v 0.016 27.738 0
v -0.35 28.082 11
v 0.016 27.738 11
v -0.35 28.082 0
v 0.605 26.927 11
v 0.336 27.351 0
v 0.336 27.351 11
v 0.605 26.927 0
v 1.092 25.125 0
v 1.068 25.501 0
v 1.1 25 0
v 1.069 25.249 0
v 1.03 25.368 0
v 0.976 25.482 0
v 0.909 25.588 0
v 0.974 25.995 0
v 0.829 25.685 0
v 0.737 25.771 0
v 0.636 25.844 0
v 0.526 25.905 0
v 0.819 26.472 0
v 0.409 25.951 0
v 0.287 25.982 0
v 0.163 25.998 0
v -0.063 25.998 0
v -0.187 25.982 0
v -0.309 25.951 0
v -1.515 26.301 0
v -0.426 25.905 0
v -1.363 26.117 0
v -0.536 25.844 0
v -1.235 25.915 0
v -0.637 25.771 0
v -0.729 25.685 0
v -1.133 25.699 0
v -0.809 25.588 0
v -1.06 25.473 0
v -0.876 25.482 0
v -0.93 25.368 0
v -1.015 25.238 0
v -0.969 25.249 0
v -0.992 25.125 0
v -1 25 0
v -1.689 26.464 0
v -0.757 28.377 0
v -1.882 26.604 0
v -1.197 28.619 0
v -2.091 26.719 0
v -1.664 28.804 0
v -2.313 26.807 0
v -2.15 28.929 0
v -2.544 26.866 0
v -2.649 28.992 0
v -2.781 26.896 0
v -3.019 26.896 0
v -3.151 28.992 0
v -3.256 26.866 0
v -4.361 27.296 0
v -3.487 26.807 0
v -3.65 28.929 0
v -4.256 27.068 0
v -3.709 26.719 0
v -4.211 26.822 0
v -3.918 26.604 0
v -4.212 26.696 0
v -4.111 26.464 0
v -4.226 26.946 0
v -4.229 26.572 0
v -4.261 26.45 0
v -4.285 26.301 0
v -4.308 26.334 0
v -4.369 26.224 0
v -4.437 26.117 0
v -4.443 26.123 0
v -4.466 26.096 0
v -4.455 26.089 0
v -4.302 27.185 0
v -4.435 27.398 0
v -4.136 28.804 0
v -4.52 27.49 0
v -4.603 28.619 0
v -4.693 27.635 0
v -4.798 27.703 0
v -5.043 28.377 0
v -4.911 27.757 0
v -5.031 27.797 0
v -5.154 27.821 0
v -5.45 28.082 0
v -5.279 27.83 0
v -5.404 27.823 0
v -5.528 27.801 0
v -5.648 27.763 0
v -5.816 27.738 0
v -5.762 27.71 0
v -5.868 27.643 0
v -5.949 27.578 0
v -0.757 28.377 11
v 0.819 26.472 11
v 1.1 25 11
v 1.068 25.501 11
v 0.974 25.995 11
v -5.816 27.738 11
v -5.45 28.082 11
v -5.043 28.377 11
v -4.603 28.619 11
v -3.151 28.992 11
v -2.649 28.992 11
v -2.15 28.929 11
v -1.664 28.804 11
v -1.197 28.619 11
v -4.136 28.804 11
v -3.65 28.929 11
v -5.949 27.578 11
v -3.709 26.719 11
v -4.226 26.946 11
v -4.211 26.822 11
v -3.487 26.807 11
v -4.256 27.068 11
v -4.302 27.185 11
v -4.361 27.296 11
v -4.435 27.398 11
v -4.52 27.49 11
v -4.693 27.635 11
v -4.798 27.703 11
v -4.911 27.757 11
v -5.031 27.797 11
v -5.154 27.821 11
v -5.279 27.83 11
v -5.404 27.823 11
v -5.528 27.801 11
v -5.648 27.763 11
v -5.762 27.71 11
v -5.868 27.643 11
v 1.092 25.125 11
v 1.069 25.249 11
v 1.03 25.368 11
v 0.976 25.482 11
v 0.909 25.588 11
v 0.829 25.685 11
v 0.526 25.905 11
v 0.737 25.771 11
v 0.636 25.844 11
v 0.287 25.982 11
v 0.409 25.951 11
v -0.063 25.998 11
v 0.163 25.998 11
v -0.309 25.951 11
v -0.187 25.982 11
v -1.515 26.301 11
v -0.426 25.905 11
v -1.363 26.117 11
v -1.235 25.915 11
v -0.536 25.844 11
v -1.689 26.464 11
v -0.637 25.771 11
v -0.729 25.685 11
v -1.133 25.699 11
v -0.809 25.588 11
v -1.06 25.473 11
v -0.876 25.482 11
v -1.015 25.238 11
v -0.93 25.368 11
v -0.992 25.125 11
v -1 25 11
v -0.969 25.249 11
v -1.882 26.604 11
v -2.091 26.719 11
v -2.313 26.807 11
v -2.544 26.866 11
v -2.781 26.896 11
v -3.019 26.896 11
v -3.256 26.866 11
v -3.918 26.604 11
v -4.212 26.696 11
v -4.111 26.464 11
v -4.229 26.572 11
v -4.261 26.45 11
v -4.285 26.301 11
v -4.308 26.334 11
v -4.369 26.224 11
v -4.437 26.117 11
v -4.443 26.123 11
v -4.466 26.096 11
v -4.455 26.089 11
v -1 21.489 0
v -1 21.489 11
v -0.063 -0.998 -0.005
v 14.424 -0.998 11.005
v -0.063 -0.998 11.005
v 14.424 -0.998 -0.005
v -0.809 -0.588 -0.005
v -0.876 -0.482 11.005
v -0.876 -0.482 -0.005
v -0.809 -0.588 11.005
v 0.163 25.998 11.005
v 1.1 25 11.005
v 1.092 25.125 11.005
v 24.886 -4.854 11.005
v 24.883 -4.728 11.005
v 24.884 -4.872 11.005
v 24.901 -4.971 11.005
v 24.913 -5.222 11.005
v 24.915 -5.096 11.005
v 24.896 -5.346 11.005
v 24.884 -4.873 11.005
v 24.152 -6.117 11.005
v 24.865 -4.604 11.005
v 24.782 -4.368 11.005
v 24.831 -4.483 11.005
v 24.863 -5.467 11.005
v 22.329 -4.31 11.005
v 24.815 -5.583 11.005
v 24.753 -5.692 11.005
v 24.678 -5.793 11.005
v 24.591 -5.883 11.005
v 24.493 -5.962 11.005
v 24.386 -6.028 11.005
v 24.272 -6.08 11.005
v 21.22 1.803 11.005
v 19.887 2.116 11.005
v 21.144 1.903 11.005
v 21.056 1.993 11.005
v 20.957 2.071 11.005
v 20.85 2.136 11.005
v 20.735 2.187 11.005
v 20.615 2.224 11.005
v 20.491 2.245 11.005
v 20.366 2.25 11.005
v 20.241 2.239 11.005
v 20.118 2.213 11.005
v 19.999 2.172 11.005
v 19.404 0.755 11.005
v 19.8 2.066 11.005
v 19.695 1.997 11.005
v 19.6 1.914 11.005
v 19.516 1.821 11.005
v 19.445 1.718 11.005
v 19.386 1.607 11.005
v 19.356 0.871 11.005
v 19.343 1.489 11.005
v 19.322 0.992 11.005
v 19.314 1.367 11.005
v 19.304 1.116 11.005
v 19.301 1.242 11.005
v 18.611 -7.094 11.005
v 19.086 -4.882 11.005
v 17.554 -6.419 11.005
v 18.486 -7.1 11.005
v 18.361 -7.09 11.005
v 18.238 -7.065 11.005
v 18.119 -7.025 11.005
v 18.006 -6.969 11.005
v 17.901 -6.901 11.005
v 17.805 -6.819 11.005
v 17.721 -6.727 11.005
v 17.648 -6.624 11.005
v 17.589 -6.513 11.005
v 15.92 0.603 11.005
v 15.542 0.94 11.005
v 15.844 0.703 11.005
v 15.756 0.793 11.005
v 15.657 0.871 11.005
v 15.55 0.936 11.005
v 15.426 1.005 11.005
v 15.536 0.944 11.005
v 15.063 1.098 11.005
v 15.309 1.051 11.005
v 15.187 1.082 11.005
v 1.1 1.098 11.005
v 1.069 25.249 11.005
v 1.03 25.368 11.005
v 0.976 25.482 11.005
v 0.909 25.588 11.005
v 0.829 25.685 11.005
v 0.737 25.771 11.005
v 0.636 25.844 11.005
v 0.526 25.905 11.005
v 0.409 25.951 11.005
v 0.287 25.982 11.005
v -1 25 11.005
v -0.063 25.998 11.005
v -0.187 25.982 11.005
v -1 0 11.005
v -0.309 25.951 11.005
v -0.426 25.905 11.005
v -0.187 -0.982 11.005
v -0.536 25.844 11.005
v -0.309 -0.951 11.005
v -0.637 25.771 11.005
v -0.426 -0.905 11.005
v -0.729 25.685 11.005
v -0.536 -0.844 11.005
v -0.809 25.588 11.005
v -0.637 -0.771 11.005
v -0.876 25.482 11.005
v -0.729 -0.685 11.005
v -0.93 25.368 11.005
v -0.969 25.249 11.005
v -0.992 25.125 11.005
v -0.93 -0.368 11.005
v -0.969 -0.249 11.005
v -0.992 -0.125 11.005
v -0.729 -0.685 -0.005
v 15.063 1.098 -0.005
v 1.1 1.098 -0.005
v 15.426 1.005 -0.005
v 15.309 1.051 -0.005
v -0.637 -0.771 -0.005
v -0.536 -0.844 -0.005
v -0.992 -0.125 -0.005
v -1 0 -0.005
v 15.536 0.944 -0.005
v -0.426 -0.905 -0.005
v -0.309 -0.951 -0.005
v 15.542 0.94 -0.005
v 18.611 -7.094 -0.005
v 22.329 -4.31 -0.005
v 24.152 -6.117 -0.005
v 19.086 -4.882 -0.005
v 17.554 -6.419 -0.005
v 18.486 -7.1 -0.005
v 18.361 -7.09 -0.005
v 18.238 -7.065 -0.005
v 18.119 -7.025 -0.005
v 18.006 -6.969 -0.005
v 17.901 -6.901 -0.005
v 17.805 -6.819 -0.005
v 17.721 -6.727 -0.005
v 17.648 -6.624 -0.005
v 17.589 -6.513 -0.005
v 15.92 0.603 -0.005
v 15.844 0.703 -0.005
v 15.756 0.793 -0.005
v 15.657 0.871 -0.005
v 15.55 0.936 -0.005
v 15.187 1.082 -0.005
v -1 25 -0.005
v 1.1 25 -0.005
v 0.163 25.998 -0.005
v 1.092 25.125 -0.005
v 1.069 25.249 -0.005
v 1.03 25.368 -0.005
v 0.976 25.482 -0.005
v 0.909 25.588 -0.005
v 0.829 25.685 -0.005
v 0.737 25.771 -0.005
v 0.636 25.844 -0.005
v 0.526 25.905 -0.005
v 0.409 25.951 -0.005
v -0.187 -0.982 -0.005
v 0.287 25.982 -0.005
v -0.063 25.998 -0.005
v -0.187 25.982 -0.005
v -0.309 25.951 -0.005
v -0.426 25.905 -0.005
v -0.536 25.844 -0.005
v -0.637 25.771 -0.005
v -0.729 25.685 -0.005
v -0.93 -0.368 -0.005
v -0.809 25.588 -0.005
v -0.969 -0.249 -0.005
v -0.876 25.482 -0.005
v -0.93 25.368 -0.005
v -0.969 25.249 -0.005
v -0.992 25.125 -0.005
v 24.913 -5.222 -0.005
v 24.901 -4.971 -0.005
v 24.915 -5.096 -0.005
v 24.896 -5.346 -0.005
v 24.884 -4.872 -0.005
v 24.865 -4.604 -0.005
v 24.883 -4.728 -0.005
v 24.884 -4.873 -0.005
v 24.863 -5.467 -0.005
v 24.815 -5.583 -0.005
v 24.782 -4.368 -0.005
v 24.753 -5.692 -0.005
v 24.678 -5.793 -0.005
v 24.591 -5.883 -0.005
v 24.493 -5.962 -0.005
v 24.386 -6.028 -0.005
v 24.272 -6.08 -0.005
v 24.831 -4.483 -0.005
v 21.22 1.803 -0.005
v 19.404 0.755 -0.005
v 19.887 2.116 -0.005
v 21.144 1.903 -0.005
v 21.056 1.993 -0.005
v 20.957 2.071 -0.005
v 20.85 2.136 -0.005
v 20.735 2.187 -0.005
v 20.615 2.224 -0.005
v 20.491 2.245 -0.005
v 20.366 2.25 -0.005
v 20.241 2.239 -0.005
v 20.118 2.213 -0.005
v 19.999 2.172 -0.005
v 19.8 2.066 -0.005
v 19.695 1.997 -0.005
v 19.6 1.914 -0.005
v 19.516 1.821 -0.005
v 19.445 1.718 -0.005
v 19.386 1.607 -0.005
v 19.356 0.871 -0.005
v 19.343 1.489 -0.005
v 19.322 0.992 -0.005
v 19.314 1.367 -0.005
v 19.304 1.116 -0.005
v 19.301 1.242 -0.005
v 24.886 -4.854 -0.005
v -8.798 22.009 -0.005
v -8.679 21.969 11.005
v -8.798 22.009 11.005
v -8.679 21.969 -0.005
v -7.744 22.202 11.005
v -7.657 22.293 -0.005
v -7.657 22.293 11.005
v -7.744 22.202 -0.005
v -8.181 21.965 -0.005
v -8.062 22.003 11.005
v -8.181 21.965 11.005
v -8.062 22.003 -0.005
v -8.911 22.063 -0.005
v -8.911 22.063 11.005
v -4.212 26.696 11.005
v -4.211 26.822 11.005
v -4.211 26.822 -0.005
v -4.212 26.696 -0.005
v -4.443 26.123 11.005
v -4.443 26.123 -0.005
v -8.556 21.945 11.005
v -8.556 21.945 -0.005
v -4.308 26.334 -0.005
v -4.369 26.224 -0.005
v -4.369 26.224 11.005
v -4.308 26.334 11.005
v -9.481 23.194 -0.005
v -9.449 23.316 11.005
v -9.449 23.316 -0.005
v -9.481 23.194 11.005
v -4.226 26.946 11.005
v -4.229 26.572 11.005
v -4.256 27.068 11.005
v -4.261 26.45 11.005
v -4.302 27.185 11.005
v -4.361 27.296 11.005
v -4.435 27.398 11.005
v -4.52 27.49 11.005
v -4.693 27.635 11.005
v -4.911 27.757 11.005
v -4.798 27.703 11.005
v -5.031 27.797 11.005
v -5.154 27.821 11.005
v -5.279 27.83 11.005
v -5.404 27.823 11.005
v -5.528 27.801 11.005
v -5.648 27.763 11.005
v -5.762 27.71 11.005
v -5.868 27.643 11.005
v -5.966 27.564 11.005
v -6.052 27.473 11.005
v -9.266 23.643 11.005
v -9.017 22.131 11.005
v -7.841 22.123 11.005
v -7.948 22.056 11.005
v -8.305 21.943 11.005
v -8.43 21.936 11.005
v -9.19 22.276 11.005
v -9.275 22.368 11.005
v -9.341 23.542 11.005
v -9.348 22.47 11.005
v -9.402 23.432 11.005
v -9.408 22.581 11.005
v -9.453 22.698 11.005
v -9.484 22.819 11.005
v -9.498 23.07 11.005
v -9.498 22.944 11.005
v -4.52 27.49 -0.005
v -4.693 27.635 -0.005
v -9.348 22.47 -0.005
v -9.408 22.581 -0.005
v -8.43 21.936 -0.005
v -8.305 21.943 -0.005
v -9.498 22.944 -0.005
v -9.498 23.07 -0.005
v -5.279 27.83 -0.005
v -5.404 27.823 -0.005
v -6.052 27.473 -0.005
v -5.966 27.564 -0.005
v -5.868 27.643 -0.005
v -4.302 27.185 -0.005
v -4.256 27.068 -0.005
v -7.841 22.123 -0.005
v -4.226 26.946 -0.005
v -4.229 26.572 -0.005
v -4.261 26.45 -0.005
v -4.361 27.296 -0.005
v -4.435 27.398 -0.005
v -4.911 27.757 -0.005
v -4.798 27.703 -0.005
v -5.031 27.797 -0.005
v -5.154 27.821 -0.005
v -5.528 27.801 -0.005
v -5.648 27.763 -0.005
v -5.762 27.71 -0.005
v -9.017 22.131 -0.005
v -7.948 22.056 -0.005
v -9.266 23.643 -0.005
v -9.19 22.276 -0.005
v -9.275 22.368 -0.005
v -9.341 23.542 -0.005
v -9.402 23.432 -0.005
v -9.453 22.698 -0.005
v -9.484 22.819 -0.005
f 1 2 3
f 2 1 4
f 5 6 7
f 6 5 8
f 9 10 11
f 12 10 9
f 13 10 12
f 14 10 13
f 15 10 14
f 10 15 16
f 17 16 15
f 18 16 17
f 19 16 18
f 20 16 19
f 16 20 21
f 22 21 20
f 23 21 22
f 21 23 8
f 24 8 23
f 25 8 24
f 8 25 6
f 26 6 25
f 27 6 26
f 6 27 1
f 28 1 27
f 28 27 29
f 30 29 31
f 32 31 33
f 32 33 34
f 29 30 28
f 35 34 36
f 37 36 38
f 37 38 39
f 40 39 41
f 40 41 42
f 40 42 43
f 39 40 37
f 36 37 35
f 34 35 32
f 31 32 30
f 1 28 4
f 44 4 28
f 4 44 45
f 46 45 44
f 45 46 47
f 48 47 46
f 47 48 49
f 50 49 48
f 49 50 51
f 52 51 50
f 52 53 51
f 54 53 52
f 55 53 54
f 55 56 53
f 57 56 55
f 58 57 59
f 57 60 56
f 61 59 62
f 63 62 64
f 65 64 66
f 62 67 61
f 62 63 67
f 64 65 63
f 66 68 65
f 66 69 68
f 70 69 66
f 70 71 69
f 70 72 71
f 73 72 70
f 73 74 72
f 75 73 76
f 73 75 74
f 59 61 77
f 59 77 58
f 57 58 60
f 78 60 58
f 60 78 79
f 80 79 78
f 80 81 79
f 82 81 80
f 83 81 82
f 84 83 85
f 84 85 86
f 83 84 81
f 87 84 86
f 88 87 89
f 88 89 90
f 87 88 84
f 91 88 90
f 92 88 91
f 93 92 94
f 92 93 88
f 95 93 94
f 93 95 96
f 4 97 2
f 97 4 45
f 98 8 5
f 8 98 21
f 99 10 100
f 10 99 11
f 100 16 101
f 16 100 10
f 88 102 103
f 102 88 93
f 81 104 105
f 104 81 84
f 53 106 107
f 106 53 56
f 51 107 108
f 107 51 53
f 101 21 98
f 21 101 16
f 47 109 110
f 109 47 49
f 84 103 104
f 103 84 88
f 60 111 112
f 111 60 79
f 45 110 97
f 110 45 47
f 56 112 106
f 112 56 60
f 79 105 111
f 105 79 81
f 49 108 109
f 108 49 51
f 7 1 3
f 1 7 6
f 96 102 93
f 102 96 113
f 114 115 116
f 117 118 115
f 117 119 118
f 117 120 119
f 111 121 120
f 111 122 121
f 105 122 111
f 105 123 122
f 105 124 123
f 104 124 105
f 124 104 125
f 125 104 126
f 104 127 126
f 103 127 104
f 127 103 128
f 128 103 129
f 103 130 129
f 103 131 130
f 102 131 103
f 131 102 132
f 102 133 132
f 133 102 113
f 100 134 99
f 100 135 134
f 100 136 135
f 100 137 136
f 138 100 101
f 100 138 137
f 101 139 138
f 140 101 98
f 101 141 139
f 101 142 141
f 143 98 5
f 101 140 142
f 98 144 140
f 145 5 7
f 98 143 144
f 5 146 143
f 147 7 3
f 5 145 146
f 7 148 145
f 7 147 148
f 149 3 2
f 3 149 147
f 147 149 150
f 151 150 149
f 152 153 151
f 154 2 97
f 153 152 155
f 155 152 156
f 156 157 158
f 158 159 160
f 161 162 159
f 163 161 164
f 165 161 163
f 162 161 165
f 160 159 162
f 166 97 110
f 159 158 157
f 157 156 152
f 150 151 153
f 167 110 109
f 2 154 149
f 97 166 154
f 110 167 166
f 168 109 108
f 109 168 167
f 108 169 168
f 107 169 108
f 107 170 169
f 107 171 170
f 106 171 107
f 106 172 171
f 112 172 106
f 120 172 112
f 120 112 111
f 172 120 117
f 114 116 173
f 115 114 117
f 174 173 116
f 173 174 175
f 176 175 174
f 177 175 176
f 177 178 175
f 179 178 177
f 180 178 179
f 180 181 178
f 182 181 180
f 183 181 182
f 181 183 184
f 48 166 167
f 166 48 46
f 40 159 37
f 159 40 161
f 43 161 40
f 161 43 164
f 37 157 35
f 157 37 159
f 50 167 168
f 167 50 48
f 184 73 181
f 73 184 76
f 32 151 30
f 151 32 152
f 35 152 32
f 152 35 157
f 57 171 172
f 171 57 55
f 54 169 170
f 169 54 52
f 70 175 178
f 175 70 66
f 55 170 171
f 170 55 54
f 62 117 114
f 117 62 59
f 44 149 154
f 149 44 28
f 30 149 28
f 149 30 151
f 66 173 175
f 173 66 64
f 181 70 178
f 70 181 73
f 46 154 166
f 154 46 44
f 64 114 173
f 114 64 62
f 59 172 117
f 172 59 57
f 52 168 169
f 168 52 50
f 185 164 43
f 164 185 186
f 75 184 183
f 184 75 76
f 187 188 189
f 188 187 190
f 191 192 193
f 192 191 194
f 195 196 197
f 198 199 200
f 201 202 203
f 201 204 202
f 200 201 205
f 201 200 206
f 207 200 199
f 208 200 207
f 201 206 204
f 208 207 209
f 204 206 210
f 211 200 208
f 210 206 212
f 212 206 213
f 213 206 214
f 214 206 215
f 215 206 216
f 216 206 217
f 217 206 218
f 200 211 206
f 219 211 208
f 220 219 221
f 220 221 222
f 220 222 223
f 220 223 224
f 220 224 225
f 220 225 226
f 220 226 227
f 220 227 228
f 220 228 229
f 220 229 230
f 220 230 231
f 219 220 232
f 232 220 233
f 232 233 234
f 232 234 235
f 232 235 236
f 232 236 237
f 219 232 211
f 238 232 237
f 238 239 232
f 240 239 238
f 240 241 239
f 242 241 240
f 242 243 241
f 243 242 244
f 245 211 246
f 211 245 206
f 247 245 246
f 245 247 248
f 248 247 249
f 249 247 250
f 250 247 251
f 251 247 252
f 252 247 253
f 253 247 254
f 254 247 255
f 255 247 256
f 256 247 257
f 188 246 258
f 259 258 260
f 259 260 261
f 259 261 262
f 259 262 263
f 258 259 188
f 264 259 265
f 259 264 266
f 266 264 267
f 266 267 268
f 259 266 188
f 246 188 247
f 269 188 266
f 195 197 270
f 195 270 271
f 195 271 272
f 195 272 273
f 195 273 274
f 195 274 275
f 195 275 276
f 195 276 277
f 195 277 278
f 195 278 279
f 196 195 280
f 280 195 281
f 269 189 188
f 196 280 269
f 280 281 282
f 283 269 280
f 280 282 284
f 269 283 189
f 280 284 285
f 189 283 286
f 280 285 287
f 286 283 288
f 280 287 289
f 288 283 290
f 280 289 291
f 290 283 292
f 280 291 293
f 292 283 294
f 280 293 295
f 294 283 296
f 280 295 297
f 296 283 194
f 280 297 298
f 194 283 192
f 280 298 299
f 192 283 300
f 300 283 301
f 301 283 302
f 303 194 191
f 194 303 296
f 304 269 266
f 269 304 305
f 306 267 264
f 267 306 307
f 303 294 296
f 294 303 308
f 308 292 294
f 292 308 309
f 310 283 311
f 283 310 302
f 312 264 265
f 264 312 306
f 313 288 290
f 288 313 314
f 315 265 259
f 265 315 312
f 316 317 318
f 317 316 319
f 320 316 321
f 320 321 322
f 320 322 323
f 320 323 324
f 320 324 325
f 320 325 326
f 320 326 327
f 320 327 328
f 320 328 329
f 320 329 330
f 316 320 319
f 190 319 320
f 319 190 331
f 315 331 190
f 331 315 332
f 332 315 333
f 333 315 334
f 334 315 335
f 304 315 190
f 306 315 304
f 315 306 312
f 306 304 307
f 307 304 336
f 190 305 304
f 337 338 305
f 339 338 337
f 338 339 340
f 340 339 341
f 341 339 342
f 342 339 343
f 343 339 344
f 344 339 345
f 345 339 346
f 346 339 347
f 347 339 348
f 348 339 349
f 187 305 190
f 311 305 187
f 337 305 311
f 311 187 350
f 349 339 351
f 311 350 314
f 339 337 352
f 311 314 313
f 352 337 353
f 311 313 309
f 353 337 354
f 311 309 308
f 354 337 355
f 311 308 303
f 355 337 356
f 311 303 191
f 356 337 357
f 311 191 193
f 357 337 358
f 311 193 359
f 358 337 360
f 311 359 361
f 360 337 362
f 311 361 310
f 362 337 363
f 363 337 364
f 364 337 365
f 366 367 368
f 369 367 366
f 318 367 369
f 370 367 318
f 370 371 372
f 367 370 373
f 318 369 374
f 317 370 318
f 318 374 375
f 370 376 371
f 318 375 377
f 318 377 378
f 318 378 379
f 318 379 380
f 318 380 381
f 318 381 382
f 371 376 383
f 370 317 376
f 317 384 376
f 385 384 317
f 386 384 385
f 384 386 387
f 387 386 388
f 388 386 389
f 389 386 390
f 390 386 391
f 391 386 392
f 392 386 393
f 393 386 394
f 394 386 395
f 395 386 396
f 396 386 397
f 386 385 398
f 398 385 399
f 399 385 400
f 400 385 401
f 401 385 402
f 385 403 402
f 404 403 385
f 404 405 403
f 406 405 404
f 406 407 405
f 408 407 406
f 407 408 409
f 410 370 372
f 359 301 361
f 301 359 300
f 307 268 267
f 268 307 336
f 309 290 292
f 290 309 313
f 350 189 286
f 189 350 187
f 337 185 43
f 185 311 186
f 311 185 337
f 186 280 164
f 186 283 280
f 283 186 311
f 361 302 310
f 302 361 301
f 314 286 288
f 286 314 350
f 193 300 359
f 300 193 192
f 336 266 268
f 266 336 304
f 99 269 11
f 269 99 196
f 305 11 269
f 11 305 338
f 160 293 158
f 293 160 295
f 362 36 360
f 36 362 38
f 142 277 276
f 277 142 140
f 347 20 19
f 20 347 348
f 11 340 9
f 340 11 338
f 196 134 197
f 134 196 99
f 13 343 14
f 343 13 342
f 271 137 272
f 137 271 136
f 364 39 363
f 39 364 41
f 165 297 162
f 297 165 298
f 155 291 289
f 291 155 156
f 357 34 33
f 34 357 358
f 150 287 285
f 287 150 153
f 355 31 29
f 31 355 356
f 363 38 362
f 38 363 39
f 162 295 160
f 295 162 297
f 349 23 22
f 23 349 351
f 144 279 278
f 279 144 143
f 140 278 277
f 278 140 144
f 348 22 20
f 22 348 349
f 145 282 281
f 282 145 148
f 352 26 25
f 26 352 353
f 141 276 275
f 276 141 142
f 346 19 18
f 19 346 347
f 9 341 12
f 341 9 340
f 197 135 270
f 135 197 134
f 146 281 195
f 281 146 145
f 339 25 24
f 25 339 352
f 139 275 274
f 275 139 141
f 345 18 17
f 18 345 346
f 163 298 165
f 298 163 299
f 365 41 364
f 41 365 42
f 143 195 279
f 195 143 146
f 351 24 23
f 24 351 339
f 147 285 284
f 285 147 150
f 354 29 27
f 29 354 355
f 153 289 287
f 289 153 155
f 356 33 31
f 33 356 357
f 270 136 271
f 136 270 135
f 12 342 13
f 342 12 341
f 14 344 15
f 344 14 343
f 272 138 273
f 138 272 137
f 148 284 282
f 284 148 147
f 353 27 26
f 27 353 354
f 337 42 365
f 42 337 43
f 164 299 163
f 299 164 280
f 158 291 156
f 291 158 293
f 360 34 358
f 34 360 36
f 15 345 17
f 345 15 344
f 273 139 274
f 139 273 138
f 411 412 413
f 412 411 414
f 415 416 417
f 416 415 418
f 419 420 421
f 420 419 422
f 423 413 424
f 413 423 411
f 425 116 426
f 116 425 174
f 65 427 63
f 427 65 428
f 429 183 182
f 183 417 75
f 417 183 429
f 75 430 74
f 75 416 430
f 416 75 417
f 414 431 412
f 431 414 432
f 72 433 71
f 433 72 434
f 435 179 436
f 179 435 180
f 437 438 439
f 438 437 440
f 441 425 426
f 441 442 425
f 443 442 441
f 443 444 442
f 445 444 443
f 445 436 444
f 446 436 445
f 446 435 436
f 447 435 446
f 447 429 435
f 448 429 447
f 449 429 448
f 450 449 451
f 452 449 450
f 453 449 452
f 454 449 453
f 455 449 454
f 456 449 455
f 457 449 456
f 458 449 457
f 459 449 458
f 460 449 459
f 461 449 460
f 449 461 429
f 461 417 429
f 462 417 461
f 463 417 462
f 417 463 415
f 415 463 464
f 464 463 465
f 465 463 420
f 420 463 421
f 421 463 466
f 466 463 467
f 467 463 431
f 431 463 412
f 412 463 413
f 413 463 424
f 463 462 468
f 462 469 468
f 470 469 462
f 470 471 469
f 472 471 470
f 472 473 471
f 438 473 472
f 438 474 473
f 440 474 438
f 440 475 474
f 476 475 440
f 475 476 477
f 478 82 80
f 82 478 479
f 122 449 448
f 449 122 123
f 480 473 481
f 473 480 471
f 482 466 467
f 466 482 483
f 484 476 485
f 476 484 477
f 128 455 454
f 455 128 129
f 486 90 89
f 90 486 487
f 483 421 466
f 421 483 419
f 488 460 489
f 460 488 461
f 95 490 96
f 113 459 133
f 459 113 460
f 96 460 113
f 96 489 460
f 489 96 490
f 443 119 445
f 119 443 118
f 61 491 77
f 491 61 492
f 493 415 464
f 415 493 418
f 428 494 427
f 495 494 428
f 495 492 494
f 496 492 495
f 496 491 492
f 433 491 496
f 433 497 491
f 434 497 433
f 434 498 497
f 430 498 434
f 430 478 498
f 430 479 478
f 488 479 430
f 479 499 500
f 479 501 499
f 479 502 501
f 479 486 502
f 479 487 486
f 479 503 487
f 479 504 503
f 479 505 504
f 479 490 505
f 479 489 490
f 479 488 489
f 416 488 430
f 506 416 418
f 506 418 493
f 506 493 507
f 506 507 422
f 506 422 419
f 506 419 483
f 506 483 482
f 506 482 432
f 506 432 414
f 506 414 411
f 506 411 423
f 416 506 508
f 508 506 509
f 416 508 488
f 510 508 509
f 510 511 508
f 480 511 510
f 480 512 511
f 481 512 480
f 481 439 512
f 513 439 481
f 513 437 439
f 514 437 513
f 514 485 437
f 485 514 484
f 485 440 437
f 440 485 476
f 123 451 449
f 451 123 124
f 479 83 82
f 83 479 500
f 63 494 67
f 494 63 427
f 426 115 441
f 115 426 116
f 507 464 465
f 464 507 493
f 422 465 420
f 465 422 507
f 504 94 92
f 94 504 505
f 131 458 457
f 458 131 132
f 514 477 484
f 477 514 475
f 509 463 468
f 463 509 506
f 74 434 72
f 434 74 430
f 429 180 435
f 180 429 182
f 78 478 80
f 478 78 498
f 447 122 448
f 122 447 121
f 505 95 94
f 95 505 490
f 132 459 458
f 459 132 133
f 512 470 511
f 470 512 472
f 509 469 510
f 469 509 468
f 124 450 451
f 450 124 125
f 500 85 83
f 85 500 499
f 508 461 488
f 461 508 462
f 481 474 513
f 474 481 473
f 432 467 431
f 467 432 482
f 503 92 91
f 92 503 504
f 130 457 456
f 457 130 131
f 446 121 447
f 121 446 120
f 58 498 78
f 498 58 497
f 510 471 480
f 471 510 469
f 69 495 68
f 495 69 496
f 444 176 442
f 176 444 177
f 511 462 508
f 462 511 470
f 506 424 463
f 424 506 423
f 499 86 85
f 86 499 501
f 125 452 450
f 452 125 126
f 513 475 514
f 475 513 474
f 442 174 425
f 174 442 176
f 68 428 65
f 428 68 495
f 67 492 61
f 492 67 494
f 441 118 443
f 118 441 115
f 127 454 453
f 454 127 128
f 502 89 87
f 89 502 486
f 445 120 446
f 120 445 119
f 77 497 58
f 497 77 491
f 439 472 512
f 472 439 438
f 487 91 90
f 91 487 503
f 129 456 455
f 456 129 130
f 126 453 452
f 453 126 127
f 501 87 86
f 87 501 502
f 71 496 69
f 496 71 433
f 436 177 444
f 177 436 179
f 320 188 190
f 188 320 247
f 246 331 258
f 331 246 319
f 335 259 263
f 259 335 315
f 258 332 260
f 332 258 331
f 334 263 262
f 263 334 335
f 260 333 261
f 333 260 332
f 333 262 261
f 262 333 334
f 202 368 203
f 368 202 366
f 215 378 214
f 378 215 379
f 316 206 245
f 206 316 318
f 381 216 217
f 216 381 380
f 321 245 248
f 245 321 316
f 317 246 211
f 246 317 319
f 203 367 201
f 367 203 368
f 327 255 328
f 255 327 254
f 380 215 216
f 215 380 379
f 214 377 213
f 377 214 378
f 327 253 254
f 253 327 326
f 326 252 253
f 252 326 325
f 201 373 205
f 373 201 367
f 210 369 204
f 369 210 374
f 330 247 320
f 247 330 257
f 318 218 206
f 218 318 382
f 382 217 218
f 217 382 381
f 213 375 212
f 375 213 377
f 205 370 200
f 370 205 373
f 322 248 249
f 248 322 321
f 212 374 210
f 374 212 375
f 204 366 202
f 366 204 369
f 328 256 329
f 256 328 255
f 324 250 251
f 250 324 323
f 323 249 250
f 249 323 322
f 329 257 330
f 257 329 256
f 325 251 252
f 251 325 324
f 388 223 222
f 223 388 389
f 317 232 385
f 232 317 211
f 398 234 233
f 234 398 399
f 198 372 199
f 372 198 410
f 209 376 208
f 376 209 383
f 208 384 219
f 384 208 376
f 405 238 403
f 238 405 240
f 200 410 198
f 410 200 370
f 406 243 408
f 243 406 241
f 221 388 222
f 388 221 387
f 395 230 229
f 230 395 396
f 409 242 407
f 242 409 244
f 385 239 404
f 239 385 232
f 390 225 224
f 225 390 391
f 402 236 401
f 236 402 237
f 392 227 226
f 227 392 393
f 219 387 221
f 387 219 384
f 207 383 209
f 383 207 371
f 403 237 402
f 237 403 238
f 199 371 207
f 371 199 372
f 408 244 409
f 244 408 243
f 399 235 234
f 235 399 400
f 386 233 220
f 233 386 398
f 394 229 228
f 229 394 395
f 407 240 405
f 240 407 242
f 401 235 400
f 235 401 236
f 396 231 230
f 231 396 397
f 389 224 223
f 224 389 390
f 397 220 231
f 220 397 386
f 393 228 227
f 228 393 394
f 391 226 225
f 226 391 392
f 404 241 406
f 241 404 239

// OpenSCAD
$fn = 50;
h = 11;

minkowski() {
	cube([15, 0.1, h]);
	
	cylinder(0.01, 1, 1, center=true);
}


minkowski() {
	cube([0.1, 25, h]);
	
	cylinder(0.01, 1, 1, center=true);
}



translate([-2.9, 25, 0]) {
	difference() {
		cylinder(h, 4, 4);
		
		translate([0, 0, -0.5])
			cylinder(h+1, 1.9, 1.9);
	
		translate([0, -5, -0.5])
			cube([1.9, 5, h+1]);

		translate([0, 0, -0.5])
			linear_extrude(height=h+1)
				polygon([[0,0], [0, -10], [-10, -10], [-10, tan(35) * 10]]);		
	}
	
}


translate([-8.5, 23, 0])
rotate([0, 0, -40])
minkowski() {
	cube([0.1, 5, h]);
	
	cylinder(0.01, 1, 1, center=true);
}


translate([15, 0, 0])
	rotate([0, 0, -60])
	minkowski() {
		cube([7, 0.1, h]);
		
		cylinder(0.01, 1, 1, center=true);
	}
	
	
translate([18.5, -6.1, 0])
	rotate([0, 0, 10])
	minkowski() {
		cube([5.5, 0.1, h]);
		
		cylinder(0.01, 1, 1, center=true);
	}
	
	
translate([20.3, 1.2, 0])
	rotate([0, 0, -60])
	minkowski() {
		cube([7, 0.1, h]);
		
		cylinder(0.01, 1, 1, center=true);
	}
